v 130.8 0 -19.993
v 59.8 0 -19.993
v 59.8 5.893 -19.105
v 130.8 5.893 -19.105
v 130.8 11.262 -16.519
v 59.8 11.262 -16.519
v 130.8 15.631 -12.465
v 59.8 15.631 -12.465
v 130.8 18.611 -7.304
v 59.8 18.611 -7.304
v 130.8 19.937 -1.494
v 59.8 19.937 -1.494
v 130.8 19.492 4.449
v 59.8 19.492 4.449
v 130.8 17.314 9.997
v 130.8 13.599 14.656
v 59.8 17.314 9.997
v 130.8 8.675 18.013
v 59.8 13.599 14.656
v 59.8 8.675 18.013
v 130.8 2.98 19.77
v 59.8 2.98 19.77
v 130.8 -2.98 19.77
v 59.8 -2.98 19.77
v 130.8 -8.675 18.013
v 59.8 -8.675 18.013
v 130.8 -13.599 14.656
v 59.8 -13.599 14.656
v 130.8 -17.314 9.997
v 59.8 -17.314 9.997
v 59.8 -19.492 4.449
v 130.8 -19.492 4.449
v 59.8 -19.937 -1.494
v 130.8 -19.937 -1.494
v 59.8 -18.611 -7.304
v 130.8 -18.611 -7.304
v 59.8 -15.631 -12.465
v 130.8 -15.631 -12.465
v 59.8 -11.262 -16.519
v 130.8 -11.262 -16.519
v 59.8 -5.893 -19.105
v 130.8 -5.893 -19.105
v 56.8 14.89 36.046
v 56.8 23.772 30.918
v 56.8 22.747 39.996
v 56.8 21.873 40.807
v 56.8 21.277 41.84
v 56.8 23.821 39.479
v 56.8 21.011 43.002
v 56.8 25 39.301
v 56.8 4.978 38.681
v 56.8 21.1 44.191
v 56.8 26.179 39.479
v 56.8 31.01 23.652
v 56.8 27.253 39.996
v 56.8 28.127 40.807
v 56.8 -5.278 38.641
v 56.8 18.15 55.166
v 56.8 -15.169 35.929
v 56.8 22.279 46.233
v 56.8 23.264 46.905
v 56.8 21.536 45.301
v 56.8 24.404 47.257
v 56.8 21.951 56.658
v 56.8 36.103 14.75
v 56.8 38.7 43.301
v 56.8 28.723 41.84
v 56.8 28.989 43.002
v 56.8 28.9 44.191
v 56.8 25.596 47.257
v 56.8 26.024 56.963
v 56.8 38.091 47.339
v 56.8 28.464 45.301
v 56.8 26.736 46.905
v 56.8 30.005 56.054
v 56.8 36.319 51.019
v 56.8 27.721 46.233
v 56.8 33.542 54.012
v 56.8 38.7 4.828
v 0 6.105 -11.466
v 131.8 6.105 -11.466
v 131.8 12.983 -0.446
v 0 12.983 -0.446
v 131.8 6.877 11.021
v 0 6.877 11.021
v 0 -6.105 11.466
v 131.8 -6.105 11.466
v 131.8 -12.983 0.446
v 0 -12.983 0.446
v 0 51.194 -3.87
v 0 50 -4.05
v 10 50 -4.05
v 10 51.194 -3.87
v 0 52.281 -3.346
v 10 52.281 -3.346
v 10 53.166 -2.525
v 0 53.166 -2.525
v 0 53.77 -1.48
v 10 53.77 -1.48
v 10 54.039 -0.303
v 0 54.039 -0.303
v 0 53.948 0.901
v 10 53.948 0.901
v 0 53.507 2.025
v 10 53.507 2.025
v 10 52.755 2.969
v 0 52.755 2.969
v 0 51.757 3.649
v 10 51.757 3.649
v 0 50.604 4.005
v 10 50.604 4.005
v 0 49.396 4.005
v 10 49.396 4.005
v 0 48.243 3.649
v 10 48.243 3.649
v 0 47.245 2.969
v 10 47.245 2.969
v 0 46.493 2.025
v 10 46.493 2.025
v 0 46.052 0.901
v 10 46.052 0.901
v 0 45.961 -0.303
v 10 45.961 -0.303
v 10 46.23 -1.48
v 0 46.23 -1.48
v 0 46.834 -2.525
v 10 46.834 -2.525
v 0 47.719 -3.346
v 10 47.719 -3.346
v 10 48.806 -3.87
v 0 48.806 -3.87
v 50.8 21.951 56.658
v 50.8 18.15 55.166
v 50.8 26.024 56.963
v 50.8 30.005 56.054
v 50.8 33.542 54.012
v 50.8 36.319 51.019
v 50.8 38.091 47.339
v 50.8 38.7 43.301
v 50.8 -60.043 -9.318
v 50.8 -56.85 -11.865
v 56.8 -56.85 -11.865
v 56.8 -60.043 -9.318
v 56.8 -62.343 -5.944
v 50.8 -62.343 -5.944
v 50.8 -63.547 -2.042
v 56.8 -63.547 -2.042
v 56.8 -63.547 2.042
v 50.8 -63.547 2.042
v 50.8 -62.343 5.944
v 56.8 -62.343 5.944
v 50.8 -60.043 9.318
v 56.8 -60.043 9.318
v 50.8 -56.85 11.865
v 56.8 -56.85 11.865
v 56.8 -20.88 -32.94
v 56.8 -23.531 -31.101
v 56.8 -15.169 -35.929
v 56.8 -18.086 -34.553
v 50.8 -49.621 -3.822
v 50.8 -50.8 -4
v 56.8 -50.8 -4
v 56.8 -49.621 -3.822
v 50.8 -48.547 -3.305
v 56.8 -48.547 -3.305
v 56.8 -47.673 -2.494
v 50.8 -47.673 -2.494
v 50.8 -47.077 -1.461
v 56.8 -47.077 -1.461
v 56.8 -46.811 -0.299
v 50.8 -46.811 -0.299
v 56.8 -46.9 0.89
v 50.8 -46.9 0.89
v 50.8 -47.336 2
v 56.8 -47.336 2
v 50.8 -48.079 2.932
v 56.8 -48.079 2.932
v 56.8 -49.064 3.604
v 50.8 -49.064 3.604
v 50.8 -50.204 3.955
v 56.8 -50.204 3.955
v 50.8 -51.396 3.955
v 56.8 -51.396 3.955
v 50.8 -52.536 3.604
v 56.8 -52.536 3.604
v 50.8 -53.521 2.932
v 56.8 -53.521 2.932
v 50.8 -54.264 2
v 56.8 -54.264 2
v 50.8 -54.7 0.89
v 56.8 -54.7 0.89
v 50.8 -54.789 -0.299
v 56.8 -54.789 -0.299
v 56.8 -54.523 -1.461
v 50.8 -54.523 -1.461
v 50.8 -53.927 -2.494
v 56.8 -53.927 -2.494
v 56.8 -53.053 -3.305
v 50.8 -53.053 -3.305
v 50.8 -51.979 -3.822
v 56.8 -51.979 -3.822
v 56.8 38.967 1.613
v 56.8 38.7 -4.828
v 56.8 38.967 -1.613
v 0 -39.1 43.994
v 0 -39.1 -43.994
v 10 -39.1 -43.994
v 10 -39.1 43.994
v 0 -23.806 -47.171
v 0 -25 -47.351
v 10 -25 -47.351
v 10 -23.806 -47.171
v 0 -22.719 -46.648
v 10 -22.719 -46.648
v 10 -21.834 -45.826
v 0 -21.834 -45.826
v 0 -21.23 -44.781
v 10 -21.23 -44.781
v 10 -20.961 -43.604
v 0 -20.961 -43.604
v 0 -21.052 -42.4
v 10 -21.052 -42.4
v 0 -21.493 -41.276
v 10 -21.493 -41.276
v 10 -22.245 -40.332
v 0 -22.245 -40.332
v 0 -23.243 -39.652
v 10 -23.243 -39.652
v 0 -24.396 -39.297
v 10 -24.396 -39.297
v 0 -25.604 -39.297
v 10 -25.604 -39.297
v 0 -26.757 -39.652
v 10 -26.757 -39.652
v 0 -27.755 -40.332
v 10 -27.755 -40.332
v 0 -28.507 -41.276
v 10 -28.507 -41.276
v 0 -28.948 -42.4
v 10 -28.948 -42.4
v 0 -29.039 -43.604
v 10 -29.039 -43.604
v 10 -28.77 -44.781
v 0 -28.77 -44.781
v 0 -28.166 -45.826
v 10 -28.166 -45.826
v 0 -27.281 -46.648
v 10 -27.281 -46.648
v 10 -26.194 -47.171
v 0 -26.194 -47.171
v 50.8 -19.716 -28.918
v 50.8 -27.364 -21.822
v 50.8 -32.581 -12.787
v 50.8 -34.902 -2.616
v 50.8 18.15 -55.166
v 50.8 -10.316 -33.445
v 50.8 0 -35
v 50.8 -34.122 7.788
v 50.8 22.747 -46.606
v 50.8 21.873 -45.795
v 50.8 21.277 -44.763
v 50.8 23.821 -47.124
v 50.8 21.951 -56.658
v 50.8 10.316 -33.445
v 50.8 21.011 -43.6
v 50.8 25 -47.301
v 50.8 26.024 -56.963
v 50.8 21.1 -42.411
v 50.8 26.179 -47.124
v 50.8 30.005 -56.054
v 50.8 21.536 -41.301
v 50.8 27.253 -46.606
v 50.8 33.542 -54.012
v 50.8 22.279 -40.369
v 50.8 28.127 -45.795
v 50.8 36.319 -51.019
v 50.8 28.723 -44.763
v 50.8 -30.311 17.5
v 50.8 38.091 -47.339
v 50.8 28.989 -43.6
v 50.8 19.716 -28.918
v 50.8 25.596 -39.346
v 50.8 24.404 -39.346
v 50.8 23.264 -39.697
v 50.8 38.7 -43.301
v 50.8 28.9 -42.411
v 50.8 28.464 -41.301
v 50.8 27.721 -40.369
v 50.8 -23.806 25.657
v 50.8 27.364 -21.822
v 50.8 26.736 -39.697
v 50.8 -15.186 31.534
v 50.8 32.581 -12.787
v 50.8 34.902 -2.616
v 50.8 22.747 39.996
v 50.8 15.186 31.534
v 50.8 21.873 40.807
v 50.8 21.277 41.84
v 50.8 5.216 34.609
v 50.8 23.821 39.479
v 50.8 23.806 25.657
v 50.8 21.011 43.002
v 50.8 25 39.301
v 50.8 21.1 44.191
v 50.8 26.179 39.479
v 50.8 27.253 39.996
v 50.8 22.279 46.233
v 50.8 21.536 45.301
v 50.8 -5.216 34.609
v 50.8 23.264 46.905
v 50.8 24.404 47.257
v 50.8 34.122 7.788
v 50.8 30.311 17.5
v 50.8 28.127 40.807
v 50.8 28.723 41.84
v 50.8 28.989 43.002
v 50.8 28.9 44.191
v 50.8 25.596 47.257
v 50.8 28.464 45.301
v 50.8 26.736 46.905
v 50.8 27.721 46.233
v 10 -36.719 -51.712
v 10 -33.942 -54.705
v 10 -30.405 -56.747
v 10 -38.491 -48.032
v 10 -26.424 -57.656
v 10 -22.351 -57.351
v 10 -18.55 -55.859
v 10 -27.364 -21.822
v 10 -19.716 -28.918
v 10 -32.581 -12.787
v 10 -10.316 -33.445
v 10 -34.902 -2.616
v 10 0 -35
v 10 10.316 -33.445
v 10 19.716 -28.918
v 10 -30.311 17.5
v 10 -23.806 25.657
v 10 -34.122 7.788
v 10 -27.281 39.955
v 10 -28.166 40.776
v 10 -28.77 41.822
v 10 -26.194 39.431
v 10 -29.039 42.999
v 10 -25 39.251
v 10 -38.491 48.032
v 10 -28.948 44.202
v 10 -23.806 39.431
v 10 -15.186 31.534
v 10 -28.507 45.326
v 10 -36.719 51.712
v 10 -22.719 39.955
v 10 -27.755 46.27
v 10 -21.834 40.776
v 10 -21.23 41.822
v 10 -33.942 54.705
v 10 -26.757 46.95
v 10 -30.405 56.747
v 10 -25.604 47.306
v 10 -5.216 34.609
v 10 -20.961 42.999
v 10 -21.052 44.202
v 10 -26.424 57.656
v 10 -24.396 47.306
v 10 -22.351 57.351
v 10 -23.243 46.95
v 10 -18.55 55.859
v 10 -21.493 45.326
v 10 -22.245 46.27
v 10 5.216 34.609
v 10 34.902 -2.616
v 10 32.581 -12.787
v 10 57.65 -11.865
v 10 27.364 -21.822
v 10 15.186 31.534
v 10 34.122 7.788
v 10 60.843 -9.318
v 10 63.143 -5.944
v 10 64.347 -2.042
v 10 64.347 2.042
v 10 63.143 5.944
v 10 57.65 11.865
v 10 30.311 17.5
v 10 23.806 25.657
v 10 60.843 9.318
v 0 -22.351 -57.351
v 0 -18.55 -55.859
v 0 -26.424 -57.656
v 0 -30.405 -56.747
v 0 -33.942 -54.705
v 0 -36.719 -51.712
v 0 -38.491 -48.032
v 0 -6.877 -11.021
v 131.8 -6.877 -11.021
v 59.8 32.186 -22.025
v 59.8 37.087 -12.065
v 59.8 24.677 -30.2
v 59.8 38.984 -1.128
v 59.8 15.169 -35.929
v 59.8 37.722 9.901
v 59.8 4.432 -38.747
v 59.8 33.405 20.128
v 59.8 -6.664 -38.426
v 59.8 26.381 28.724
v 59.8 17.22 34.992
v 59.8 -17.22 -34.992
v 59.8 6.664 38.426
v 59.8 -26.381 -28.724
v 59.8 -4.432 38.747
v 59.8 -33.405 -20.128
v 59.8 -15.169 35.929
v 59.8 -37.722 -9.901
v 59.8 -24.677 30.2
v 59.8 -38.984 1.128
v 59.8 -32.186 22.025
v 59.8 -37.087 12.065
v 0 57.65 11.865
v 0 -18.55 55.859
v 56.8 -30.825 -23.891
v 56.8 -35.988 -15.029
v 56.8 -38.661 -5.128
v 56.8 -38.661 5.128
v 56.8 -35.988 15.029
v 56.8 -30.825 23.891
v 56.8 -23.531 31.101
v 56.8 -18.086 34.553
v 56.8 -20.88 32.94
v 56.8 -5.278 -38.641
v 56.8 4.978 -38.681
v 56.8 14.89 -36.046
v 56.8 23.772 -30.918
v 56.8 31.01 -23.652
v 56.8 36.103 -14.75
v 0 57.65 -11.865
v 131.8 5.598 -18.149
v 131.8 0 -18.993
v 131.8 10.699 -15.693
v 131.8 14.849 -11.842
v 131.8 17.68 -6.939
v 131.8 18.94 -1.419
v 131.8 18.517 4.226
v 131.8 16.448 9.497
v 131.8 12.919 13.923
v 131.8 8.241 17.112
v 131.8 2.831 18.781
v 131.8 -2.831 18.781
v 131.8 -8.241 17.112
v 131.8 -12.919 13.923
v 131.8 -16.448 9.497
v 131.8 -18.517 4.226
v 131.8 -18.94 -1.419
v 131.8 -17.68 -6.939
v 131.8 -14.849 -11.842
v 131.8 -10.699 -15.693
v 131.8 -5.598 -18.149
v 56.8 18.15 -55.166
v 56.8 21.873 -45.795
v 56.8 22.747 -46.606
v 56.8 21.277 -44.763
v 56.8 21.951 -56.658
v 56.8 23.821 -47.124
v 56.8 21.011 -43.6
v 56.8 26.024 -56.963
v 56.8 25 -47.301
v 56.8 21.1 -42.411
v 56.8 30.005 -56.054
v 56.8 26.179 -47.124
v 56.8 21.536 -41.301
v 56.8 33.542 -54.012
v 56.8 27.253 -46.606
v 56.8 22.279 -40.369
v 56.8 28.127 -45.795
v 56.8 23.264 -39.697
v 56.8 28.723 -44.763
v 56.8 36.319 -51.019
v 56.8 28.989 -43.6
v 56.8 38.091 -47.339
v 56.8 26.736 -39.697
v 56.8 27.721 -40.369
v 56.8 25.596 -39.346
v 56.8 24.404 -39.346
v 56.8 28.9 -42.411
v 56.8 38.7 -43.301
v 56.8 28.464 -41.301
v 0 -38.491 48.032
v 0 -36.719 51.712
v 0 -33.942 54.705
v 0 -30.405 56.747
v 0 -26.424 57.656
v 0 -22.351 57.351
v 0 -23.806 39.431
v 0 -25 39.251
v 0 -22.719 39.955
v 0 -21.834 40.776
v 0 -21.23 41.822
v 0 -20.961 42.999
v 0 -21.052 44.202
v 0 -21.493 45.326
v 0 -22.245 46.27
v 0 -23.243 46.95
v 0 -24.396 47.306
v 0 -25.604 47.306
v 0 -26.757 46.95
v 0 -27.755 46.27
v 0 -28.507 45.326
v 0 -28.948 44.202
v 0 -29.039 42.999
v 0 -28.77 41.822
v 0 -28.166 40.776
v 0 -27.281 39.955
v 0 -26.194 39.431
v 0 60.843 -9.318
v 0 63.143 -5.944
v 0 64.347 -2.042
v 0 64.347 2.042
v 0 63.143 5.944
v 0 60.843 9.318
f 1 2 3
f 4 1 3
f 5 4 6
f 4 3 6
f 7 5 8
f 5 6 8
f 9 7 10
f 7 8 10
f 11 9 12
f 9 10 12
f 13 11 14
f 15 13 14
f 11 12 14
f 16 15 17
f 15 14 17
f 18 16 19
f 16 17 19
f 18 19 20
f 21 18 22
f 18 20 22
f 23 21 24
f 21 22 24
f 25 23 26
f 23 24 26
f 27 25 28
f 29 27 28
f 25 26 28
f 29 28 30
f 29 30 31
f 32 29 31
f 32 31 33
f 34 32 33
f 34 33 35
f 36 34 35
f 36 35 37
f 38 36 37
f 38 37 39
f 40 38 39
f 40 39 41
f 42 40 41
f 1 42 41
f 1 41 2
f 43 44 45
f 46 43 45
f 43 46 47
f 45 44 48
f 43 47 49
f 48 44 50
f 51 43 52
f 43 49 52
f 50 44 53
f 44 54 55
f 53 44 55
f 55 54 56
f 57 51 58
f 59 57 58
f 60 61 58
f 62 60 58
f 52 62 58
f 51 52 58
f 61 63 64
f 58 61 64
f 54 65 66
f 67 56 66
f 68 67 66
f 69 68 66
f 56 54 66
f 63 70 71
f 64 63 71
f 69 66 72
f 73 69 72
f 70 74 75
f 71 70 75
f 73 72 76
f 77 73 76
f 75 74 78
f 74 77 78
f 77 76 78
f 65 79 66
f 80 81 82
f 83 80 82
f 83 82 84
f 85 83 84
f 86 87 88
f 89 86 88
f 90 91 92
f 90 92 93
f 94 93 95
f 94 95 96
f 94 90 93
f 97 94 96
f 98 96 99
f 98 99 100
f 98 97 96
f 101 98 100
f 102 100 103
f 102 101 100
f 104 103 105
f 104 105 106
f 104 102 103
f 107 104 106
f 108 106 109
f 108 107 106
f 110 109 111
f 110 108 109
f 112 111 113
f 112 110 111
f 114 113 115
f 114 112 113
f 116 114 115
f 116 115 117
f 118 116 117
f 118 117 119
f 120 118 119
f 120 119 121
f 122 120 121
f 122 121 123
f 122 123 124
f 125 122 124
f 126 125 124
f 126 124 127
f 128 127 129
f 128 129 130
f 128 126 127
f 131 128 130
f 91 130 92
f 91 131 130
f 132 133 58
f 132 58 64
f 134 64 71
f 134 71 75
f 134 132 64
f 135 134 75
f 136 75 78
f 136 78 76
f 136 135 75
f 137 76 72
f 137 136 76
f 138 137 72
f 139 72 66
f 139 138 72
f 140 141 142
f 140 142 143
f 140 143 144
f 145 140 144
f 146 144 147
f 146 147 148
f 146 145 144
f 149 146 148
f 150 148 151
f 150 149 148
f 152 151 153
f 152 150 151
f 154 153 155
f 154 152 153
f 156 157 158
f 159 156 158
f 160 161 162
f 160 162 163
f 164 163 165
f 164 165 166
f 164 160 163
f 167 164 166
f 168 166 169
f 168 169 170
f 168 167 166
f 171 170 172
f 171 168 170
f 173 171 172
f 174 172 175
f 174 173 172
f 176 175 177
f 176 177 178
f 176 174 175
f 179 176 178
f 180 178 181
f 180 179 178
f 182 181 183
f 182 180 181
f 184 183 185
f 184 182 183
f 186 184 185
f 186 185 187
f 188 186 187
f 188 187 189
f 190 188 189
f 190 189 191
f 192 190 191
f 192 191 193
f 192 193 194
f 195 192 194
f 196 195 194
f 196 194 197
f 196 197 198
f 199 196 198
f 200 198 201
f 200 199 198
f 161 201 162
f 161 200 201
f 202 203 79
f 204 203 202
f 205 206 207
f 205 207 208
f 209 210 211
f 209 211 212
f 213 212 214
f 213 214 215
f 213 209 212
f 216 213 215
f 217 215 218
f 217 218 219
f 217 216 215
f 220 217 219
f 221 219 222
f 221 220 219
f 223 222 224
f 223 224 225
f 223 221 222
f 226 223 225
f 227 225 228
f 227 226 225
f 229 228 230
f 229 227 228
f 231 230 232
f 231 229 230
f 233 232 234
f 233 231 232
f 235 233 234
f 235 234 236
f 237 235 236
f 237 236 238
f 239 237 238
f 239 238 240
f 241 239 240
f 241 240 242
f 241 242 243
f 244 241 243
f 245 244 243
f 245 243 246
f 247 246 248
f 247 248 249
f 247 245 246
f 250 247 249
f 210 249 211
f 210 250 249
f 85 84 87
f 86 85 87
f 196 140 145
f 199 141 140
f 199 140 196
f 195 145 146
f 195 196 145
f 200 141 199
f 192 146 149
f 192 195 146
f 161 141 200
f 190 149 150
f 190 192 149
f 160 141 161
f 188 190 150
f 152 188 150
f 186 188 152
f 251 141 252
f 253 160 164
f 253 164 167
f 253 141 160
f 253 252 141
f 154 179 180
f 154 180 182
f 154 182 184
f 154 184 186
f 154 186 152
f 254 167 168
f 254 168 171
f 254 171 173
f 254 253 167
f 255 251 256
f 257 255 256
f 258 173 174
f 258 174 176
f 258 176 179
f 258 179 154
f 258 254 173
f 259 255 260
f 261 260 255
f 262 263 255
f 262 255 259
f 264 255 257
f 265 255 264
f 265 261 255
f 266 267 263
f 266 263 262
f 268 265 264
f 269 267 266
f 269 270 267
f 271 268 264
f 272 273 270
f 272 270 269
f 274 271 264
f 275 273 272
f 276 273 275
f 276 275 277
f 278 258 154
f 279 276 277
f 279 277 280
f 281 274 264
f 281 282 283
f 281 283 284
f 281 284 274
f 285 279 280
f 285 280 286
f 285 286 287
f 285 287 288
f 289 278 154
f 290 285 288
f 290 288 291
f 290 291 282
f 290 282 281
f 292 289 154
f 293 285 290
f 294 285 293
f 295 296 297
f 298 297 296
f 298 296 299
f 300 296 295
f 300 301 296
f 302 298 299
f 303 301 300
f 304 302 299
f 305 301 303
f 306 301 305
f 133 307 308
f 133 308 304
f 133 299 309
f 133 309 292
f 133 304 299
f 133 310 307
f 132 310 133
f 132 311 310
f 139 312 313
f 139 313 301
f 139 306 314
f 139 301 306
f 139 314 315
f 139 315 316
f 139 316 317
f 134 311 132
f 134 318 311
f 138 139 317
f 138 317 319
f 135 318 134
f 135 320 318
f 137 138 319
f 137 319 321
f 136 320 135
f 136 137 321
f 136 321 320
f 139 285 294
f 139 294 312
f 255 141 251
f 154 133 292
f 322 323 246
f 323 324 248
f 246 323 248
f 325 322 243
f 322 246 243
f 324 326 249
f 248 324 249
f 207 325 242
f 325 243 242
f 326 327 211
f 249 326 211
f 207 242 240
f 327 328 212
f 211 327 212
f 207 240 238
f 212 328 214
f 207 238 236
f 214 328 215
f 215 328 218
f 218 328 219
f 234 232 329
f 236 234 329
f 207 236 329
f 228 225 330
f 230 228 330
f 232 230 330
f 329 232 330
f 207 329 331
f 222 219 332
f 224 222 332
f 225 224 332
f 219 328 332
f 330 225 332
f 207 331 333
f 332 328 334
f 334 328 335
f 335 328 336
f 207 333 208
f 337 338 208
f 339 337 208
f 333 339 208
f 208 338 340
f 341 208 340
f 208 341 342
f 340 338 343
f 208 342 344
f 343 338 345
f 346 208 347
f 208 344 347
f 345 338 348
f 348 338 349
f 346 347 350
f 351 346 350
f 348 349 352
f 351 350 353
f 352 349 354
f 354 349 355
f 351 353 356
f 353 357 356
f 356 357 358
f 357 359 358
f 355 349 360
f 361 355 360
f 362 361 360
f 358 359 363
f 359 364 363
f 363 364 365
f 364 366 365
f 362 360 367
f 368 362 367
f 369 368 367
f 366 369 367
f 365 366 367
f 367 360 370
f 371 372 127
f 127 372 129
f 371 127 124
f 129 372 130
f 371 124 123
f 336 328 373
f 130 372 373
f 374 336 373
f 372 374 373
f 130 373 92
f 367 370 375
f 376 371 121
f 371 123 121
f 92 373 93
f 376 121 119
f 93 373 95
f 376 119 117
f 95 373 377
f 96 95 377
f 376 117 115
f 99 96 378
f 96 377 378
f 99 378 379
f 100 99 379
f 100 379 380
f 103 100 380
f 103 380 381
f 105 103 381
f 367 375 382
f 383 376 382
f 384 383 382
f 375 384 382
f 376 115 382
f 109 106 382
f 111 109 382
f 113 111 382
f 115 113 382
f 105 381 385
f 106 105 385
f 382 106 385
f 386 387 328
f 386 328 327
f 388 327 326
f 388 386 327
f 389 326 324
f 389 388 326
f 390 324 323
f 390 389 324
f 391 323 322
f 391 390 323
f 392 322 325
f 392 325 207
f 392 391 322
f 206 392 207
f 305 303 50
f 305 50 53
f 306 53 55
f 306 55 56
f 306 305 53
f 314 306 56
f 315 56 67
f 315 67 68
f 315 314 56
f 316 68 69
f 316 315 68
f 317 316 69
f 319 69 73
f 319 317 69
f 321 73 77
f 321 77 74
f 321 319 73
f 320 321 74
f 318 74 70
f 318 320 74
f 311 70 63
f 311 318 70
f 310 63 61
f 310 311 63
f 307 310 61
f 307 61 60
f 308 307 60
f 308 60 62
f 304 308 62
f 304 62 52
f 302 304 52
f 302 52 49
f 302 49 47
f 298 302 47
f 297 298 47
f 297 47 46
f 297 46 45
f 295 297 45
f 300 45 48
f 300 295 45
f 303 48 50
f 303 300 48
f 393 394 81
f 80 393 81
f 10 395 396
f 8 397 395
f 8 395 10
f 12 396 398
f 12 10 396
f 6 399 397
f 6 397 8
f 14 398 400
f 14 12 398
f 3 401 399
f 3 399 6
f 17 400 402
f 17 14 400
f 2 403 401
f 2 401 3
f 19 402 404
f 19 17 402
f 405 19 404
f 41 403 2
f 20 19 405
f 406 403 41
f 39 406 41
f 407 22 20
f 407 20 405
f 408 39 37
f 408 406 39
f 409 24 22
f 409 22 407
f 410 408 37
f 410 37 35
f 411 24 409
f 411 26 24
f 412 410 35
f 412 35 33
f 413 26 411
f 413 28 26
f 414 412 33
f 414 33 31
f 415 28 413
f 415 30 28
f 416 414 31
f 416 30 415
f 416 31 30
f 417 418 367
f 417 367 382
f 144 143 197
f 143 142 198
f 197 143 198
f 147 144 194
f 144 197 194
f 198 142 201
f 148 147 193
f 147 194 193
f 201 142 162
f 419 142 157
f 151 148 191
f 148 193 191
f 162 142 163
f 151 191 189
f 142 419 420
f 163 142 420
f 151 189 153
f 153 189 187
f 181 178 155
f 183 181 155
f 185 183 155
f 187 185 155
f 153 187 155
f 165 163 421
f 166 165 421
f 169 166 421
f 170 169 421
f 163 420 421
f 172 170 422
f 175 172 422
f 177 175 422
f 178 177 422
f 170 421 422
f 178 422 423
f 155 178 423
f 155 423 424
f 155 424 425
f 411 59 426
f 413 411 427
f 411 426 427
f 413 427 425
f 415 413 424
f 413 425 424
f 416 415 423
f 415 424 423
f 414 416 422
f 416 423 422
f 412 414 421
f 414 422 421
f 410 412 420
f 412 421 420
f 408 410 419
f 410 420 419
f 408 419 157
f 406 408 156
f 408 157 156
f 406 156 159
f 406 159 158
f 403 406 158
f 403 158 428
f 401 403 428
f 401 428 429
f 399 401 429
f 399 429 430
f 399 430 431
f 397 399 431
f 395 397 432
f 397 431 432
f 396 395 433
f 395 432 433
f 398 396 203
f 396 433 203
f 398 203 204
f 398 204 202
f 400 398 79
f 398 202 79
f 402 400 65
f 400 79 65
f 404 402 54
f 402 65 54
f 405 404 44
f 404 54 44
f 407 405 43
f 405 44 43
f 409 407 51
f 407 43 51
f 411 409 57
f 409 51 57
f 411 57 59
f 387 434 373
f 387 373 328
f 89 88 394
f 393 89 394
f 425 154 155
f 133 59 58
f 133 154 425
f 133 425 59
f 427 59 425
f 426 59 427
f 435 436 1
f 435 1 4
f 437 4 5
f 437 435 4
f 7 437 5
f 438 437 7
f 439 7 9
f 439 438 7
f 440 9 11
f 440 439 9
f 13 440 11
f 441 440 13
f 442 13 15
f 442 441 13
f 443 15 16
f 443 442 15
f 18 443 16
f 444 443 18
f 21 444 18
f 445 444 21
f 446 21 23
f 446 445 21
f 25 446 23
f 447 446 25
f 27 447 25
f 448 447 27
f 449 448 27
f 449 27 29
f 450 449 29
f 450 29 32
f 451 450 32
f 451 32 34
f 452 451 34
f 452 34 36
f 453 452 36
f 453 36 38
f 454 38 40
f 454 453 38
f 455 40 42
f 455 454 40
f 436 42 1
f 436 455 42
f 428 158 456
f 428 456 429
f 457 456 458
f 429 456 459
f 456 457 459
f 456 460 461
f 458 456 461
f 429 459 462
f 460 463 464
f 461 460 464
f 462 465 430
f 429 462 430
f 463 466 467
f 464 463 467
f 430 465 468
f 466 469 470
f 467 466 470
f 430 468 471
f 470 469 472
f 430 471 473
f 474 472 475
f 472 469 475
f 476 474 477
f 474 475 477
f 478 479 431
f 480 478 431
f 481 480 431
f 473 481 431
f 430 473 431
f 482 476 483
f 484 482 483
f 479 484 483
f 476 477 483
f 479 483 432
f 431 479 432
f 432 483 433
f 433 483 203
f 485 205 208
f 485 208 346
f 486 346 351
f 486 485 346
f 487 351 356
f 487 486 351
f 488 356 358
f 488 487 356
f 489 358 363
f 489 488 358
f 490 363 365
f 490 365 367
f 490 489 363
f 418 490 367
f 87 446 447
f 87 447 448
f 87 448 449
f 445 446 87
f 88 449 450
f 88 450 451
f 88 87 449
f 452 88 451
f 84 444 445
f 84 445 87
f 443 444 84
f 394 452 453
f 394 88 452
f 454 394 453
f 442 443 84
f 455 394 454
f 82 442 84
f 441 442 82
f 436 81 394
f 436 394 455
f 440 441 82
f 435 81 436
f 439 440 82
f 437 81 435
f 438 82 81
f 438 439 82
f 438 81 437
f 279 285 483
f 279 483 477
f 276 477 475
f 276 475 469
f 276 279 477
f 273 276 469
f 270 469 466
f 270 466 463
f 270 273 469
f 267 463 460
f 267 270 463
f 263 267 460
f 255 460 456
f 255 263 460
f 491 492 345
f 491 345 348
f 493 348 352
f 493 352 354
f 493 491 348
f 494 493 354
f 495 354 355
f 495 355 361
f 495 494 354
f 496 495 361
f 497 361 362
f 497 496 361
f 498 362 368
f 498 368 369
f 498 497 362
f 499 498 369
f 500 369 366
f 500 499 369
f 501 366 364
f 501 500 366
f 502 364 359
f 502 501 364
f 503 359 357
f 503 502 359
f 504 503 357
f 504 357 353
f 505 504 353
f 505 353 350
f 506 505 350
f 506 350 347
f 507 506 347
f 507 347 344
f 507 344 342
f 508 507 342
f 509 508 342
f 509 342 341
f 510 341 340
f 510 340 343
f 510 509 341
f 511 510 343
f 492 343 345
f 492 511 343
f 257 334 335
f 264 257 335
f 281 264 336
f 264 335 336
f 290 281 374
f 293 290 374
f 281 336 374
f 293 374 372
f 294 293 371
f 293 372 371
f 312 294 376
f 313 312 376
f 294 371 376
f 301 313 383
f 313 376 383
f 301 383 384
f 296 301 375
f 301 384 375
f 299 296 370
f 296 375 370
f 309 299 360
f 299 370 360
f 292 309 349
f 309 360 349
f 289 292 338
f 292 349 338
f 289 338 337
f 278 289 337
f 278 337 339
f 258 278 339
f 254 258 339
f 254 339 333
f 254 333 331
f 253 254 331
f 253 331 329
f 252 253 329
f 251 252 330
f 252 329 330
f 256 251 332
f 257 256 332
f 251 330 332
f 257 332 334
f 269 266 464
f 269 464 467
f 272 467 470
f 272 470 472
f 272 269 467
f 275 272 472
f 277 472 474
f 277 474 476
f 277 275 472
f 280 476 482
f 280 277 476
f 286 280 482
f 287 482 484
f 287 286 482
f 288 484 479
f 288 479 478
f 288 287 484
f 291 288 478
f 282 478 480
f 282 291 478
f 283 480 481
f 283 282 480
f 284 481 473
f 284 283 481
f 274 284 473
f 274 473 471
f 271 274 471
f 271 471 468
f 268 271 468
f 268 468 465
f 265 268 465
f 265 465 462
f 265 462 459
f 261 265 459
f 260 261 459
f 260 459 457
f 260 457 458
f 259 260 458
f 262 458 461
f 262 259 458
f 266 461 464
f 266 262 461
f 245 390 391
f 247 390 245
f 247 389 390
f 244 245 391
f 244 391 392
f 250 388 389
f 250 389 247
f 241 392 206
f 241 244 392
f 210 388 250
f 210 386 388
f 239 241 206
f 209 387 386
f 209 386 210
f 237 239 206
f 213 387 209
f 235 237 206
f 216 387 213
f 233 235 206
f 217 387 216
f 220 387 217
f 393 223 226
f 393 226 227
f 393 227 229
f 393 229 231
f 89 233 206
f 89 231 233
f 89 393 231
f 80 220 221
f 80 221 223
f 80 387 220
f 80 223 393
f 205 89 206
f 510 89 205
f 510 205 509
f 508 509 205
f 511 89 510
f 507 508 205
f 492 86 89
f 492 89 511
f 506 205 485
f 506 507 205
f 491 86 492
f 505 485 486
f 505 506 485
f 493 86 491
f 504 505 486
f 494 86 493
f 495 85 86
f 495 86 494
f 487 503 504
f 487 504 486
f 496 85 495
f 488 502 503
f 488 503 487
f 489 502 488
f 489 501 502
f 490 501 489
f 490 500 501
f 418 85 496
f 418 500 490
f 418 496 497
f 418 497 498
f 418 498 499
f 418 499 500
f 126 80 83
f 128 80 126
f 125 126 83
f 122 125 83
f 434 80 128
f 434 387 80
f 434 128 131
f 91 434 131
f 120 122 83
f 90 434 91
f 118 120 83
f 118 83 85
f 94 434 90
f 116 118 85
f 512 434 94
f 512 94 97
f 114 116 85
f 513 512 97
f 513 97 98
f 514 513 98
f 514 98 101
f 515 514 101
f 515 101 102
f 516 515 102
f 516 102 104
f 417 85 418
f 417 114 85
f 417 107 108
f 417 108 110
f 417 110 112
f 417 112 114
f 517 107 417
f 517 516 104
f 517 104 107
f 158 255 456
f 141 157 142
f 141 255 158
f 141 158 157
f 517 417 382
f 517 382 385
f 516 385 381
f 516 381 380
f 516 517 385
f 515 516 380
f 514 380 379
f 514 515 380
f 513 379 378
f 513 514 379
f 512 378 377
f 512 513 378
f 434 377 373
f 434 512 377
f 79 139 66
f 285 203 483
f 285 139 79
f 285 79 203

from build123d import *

# Parameters (mm, degrees)
SKETCH10_R           = 4.05
BOSS_EXTRUDE12_DEPTH = 10
SKETCH11_R           = 35
BOSS_EXTRUDE13_DEPTH = 40.8
SKETCH12_R           = 4
BOSS_EXTRUDE14_DEPTH = 6
SKETCH13_R           = 19.993
BOSS_EXTRUDE15_DEPTH = 75
SKETCH16_R           = 39
BOSS_EXTRUDE16_DEPTH = 3
CHAMFER1_SIZE        = 1
CUT_EXTRUDE2_DEPTH   = 131.8


with BuildPart() as part:
    # Sketch10 → Boss-Extrude12 (new body)
    with BuildSketch(Plane(origin=(0, 0, 0), x_dir=(0, 0, -1), z_dir=(1, 0, 0))):
        with BuildLine():
            Line((-55.858638544, -18.55), (-11.864548032, 57.65))
            ThreePointArc((-11.864548032, 57.65), (0, 64.5), (11.864548032, 57.65))
            Line((11.864548032, 57.65), (55.858638544, -18.55))
            ThreePointArc((55.858638544, -18.55), (55.858638544, -32.25), (43.994090512, -39.1))
            Line((43.994090512, -39.1), (-43.994090512, -39.1))
            ThreePointArc((-43.994090512, -39.1), (-55.858638544, -32.25), (-55.858638544, -18.55))
        make_face()
        with Locations((0, 50)):
            Circle(SKETCH10_R, mode=Mode.SUBTRACT)
        with Locations((43.301270189, -25)):
            Circle(SKETCH10_R, mode=Mode.SUBTRACT)
        with Locations((-43.301270189, -25)):
            Circle(SKETCH10_R, mode=Mode.SUBTRACT)
    extrude(amount=BOSS_EXTRUDE12_DEPTH)

    # Sketch11 → Boss-Extrude13 (add)
    with BuildSketch(Plane(origin=(10, 0, 0), x_dir=(0, 0, -1), z_dir=(1, 0, 0))):
        Circle(SKETCH11_R)
    extrude(amount=BOSS_EXTRUDE13_DEPTH)

    # Sketch12 → Boss-Extrude14 (add)
    with BuildSketch(Plane(origin=(50.8, 0, 0), x_dir=(0, 0, -1), z_dir=(1, 0, 0))):
        with BuildLine():
            Line((-43.301270189, 38.7), (43.301270189, 38.7))
            ThreePointArc((43.301270189, 38.7), (55.165818221, 31.85), (55.165818221, 18.15))
            Line((55.165818221, 18.15), (11.864548032, -56.85))
            ThreePointArc((11.864548032, -56.85), (0, -63.7), (-11.864548032, -56.85))
            Line((-11.864548032, -56.85), (-55.165818221, 18.15))
            ThreePointArc((-55.165818221, 18.15), (-55.165818221, 31.85), (-43.301270189, 38.7))
        make_face()
        with Locations((43.301270189, 25)):
            Circle(SKETCH12_R, mode=Mode.SUBTRACT)
        with Locations((0, -50.8)):
            Circle(SKETCH12_R, mode=Mode.SUBTRACT)
        with Locations((-43.301270189, 25)):
            Circle(SKETCH12_R, mode=Mode.SUBTRACT)
    extrude(amount=BOSS_EXTRUDE14_DEPTH)

    # Sketch13 → Boss-Extrude15 (add)
    with BuildSketch(Plane(origin=(56.8, 0, 0), x_dir=(0, 0, -1), z_dir=(1, 0, 0))):
        Circle(SKETCH13_R)
    extrude(amount=BOSS_EXTRUDE15_DEPTH)

    # Sketch16 → Boss-Extrude16 (add)
    with BuildSketch(Plane(origin=(56.8, 0, 0), x_dir=(0, 0, -1), z_dir=(1, 0, 0))):
        with Locations(Location((0, 0, 0), (0, 0, 202.888769737))):
            Circle(SKETCH16_R)
    extrude(amount=BOSS_EXTRUDE16_DEPTH)

    # Chamfer1
    chamfer1_edges = [part.edges().sort_by_distance(p)[0] for p in [
        (131.8, 0, 19.993),
    ]]
    chamfer(chamfer1_edges, length=CHAMFER1_SIZE)

    # Sketch14 → Cut-Extrude2 (cut)
    with BuildSketch(Plane(origin=(131.8, 0, 0), x_dir=(0, 0, -1), z_dir=(1, 0, 0))):
        Polygon((-11.46619671, -6.10543471), (-0.445636795, -12.982734991), (11.020559915, -6.877300281), (11.46619671, 6.10543471), (0.445636795, 12.982734991), (-11.020559915, 6.877300281), align=None)
    extrude(amount=-CUT_EXTRUDE2_DEPTH, mode=Mode.SUBTRACT)


solid = part.part
